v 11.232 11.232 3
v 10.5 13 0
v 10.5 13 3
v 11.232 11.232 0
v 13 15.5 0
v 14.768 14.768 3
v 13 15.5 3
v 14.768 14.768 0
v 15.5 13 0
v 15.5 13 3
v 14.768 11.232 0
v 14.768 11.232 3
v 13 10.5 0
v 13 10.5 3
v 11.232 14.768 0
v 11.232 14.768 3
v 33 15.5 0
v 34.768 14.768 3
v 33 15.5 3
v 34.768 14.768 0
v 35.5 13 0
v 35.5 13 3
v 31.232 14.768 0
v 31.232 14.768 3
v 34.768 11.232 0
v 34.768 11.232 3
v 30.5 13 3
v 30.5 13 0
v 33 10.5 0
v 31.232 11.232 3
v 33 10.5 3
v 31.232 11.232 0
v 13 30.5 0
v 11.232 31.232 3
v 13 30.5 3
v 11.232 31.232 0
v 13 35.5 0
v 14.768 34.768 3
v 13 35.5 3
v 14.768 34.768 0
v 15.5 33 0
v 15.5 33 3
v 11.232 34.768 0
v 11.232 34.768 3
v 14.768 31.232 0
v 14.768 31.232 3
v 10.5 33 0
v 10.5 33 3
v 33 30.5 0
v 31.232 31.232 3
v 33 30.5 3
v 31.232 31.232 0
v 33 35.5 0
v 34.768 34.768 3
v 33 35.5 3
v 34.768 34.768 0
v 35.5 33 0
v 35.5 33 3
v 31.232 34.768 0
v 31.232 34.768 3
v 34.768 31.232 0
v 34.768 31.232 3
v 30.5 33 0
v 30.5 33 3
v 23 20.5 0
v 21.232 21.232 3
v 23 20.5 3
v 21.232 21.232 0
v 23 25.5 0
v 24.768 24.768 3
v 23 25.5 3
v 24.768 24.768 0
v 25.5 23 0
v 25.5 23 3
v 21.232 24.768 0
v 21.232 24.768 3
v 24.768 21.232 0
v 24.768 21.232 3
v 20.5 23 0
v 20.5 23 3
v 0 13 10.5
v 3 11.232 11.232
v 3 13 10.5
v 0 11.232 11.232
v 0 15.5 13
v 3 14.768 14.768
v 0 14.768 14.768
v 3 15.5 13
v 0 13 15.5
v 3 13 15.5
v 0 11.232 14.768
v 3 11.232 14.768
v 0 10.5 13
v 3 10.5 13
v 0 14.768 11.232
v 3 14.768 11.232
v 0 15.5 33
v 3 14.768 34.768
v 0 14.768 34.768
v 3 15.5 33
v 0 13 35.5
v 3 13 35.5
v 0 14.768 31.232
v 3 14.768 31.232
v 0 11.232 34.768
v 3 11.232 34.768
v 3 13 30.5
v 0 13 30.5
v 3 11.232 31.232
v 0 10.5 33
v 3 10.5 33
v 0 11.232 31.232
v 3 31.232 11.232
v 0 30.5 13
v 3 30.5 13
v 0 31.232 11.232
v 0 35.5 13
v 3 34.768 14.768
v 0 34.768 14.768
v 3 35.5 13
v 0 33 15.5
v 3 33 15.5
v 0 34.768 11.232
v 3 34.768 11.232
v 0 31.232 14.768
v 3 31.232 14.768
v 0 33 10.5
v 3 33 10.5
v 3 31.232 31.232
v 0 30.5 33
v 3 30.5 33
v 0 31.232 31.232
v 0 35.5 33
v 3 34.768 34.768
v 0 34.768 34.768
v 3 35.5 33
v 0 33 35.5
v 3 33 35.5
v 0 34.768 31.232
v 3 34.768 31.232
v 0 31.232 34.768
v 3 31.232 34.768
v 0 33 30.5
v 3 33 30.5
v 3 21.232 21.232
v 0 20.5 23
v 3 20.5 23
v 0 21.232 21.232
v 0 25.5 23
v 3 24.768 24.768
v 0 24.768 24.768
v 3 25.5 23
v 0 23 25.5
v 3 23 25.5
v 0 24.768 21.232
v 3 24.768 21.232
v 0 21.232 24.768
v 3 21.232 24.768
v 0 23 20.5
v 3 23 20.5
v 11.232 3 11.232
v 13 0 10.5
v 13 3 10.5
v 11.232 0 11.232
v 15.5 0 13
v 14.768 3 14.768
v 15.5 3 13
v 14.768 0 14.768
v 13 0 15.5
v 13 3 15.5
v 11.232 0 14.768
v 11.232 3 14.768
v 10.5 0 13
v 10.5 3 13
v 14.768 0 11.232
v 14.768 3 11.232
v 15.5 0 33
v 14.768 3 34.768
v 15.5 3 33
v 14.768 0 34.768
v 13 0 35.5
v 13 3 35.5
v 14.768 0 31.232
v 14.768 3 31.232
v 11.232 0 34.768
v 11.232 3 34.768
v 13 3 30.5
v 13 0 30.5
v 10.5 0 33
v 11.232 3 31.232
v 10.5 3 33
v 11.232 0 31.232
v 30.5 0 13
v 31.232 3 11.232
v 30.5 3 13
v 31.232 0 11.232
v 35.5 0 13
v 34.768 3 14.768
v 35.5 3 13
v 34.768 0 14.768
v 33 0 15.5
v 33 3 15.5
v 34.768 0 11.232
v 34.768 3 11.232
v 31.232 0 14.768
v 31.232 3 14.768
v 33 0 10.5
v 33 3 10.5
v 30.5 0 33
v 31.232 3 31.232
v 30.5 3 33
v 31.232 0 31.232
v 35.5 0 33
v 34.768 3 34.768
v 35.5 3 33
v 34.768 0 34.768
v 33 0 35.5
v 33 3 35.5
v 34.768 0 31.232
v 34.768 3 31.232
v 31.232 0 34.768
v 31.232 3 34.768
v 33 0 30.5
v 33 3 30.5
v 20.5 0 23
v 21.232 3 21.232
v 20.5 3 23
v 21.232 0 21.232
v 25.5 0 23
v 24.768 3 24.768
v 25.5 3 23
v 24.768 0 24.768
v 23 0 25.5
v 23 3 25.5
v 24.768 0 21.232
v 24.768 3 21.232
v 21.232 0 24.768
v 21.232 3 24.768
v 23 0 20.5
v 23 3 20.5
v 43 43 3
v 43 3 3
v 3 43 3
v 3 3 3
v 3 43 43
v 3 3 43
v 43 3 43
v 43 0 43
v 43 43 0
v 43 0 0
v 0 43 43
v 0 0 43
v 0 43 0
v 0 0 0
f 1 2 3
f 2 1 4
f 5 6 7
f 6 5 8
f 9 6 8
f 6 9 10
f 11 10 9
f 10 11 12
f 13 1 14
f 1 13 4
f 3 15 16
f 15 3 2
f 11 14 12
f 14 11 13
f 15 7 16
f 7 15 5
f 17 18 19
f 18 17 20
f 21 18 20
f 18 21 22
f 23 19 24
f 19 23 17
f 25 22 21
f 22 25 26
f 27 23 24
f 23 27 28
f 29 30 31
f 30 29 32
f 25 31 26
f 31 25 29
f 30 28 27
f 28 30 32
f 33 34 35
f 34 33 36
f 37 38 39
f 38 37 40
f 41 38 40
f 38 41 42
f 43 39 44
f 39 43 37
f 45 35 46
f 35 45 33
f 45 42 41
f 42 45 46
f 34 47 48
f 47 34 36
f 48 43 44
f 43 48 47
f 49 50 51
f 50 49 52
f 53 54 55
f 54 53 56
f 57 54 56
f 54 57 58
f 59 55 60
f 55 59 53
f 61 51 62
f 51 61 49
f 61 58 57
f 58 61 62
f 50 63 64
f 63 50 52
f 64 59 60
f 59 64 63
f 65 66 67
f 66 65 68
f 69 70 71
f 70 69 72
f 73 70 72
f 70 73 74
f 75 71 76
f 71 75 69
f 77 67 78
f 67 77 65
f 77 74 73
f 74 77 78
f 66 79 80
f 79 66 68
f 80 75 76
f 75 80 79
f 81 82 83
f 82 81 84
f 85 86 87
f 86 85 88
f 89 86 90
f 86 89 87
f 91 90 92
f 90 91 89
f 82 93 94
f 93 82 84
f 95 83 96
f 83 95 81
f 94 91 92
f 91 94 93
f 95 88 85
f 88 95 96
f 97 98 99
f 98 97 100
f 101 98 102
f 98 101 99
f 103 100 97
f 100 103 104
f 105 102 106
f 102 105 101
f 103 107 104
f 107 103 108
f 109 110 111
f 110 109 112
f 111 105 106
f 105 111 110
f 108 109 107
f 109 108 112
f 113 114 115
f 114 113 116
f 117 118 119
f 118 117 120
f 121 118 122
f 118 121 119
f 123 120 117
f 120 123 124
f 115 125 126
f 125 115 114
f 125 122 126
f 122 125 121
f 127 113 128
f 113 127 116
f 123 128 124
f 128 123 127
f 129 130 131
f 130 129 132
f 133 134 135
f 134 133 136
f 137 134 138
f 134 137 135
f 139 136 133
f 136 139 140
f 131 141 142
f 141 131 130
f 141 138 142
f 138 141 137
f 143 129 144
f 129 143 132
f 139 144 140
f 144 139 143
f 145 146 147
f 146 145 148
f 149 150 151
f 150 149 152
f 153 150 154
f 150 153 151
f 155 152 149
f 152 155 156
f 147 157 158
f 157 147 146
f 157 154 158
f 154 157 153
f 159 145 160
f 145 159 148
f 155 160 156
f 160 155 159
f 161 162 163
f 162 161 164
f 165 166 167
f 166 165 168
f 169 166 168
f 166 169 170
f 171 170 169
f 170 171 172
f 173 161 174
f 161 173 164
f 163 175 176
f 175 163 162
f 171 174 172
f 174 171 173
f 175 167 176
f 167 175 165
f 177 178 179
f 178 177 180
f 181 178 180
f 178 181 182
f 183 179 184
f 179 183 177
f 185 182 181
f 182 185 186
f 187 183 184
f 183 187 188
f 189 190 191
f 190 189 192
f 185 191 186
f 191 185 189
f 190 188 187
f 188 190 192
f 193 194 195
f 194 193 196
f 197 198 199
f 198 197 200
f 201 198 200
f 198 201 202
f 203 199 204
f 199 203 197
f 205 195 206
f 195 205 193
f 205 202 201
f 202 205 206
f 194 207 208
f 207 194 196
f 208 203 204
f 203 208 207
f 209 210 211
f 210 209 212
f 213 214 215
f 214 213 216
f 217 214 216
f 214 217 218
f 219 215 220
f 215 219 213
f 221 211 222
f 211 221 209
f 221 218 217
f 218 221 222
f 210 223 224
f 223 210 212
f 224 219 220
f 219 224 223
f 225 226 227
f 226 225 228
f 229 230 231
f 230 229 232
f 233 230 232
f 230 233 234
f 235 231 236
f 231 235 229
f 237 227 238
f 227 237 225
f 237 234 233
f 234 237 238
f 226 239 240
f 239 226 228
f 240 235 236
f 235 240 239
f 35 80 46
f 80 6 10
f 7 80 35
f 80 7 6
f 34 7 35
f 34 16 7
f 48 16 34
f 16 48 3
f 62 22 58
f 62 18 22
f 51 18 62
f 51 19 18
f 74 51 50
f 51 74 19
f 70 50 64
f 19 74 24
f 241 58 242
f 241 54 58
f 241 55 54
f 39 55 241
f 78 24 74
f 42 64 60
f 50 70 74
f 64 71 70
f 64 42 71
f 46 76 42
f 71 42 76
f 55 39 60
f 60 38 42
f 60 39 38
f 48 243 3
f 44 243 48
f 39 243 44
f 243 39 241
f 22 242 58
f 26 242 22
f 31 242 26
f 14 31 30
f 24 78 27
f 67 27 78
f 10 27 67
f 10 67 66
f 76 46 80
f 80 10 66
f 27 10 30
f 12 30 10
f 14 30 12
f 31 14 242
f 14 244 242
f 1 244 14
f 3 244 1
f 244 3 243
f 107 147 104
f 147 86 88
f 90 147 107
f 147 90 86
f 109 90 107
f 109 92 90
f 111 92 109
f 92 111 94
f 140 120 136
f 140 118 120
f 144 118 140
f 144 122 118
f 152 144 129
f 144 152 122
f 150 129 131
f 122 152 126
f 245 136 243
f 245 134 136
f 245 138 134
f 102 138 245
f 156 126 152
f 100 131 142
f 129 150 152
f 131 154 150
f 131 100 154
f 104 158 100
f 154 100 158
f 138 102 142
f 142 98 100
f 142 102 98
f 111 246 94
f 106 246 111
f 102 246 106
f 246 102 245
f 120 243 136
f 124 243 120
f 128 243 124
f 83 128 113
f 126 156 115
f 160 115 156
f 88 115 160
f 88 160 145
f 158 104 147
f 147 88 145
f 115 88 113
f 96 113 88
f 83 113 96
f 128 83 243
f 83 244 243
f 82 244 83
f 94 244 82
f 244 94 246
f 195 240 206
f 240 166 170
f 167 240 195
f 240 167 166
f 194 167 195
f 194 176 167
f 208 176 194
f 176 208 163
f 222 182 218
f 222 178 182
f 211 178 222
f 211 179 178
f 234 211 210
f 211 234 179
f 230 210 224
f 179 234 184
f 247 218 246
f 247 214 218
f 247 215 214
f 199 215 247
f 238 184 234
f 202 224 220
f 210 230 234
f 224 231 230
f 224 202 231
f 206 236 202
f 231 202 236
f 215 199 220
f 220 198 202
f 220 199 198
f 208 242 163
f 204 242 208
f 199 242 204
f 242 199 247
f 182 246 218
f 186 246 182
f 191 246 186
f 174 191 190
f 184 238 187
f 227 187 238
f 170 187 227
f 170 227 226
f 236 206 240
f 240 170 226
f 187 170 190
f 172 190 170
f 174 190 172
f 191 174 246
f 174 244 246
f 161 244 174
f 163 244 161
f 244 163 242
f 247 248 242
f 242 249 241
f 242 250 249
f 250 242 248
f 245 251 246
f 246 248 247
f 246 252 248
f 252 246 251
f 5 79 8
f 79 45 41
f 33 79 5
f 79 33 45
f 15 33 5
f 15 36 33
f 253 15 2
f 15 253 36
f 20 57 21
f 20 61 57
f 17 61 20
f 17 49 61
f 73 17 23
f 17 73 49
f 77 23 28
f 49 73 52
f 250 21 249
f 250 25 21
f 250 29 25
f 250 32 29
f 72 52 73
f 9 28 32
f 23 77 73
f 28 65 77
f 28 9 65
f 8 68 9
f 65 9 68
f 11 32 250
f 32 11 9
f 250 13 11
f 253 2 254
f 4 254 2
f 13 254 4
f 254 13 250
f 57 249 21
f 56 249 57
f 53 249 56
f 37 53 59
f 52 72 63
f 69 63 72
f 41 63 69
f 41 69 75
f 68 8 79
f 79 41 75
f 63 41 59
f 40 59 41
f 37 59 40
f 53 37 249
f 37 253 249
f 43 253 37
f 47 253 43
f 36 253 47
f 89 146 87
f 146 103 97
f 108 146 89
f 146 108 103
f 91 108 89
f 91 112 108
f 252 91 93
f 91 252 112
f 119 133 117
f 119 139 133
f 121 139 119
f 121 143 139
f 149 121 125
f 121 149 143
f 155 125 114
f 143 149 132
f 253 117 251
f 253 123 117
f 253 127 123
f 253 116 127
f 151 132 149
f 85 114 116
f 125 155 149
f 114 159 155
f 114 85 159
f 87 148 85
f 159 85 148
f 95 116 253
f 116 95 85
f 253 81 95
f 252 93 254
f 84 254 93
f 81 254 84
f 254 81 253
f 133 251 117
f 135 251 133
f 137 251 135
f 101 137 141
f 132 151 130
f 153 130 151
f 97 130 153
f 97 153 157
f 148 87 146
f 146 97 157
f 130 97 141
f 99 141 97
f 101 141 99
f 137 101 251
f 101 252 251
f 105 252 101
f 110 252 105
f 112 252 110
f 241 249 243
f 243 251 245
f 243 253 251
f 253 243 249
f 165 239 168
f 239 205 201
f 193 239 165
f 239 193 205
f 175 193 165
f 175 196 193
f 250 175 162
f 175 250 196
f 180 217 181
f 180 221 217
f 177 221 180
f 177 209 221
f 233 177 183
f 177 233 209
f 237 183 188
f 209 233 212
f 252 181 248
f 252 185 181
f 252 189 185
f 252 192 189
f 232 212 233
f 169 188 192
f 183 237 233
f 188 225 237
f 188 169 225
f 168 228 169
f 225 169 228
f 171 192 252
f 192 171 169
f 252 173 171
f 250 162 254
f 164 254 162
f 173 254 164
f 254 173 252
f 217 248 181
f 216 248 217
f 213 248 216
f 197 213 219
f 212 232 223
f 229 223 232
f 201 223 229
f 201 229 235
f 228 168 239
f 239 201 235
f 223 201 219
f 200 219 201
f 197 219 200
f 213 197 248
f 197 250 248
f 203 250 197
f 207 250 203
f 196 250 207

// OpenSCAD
size=40;
thick=3;
hole_d=5;

module rotate_copy(vec=[0,90,0]) {
    children();
    rotate(vec) children();
}

module hole() cylinder(d=hole_d, h=thick+6);

module hole_array() {
    translate([size/4,size/4,-(thick+1)]) {
        hole();
        translate([size/2,0,0]) hole();
        translate([0,size/2,0]) hole();
        translate([size/2,size/2,0]) hole();
        translate([size/4,size/4,0]) hole();
    }
}

difference() {
    cube(size+thick);
    translate([thick,thick,thick]) {
        cube(size+thick);
        rotate_copy([0,0,-90])
        rotate_copy([0,-90,0])
        hole_array();
    }
}
